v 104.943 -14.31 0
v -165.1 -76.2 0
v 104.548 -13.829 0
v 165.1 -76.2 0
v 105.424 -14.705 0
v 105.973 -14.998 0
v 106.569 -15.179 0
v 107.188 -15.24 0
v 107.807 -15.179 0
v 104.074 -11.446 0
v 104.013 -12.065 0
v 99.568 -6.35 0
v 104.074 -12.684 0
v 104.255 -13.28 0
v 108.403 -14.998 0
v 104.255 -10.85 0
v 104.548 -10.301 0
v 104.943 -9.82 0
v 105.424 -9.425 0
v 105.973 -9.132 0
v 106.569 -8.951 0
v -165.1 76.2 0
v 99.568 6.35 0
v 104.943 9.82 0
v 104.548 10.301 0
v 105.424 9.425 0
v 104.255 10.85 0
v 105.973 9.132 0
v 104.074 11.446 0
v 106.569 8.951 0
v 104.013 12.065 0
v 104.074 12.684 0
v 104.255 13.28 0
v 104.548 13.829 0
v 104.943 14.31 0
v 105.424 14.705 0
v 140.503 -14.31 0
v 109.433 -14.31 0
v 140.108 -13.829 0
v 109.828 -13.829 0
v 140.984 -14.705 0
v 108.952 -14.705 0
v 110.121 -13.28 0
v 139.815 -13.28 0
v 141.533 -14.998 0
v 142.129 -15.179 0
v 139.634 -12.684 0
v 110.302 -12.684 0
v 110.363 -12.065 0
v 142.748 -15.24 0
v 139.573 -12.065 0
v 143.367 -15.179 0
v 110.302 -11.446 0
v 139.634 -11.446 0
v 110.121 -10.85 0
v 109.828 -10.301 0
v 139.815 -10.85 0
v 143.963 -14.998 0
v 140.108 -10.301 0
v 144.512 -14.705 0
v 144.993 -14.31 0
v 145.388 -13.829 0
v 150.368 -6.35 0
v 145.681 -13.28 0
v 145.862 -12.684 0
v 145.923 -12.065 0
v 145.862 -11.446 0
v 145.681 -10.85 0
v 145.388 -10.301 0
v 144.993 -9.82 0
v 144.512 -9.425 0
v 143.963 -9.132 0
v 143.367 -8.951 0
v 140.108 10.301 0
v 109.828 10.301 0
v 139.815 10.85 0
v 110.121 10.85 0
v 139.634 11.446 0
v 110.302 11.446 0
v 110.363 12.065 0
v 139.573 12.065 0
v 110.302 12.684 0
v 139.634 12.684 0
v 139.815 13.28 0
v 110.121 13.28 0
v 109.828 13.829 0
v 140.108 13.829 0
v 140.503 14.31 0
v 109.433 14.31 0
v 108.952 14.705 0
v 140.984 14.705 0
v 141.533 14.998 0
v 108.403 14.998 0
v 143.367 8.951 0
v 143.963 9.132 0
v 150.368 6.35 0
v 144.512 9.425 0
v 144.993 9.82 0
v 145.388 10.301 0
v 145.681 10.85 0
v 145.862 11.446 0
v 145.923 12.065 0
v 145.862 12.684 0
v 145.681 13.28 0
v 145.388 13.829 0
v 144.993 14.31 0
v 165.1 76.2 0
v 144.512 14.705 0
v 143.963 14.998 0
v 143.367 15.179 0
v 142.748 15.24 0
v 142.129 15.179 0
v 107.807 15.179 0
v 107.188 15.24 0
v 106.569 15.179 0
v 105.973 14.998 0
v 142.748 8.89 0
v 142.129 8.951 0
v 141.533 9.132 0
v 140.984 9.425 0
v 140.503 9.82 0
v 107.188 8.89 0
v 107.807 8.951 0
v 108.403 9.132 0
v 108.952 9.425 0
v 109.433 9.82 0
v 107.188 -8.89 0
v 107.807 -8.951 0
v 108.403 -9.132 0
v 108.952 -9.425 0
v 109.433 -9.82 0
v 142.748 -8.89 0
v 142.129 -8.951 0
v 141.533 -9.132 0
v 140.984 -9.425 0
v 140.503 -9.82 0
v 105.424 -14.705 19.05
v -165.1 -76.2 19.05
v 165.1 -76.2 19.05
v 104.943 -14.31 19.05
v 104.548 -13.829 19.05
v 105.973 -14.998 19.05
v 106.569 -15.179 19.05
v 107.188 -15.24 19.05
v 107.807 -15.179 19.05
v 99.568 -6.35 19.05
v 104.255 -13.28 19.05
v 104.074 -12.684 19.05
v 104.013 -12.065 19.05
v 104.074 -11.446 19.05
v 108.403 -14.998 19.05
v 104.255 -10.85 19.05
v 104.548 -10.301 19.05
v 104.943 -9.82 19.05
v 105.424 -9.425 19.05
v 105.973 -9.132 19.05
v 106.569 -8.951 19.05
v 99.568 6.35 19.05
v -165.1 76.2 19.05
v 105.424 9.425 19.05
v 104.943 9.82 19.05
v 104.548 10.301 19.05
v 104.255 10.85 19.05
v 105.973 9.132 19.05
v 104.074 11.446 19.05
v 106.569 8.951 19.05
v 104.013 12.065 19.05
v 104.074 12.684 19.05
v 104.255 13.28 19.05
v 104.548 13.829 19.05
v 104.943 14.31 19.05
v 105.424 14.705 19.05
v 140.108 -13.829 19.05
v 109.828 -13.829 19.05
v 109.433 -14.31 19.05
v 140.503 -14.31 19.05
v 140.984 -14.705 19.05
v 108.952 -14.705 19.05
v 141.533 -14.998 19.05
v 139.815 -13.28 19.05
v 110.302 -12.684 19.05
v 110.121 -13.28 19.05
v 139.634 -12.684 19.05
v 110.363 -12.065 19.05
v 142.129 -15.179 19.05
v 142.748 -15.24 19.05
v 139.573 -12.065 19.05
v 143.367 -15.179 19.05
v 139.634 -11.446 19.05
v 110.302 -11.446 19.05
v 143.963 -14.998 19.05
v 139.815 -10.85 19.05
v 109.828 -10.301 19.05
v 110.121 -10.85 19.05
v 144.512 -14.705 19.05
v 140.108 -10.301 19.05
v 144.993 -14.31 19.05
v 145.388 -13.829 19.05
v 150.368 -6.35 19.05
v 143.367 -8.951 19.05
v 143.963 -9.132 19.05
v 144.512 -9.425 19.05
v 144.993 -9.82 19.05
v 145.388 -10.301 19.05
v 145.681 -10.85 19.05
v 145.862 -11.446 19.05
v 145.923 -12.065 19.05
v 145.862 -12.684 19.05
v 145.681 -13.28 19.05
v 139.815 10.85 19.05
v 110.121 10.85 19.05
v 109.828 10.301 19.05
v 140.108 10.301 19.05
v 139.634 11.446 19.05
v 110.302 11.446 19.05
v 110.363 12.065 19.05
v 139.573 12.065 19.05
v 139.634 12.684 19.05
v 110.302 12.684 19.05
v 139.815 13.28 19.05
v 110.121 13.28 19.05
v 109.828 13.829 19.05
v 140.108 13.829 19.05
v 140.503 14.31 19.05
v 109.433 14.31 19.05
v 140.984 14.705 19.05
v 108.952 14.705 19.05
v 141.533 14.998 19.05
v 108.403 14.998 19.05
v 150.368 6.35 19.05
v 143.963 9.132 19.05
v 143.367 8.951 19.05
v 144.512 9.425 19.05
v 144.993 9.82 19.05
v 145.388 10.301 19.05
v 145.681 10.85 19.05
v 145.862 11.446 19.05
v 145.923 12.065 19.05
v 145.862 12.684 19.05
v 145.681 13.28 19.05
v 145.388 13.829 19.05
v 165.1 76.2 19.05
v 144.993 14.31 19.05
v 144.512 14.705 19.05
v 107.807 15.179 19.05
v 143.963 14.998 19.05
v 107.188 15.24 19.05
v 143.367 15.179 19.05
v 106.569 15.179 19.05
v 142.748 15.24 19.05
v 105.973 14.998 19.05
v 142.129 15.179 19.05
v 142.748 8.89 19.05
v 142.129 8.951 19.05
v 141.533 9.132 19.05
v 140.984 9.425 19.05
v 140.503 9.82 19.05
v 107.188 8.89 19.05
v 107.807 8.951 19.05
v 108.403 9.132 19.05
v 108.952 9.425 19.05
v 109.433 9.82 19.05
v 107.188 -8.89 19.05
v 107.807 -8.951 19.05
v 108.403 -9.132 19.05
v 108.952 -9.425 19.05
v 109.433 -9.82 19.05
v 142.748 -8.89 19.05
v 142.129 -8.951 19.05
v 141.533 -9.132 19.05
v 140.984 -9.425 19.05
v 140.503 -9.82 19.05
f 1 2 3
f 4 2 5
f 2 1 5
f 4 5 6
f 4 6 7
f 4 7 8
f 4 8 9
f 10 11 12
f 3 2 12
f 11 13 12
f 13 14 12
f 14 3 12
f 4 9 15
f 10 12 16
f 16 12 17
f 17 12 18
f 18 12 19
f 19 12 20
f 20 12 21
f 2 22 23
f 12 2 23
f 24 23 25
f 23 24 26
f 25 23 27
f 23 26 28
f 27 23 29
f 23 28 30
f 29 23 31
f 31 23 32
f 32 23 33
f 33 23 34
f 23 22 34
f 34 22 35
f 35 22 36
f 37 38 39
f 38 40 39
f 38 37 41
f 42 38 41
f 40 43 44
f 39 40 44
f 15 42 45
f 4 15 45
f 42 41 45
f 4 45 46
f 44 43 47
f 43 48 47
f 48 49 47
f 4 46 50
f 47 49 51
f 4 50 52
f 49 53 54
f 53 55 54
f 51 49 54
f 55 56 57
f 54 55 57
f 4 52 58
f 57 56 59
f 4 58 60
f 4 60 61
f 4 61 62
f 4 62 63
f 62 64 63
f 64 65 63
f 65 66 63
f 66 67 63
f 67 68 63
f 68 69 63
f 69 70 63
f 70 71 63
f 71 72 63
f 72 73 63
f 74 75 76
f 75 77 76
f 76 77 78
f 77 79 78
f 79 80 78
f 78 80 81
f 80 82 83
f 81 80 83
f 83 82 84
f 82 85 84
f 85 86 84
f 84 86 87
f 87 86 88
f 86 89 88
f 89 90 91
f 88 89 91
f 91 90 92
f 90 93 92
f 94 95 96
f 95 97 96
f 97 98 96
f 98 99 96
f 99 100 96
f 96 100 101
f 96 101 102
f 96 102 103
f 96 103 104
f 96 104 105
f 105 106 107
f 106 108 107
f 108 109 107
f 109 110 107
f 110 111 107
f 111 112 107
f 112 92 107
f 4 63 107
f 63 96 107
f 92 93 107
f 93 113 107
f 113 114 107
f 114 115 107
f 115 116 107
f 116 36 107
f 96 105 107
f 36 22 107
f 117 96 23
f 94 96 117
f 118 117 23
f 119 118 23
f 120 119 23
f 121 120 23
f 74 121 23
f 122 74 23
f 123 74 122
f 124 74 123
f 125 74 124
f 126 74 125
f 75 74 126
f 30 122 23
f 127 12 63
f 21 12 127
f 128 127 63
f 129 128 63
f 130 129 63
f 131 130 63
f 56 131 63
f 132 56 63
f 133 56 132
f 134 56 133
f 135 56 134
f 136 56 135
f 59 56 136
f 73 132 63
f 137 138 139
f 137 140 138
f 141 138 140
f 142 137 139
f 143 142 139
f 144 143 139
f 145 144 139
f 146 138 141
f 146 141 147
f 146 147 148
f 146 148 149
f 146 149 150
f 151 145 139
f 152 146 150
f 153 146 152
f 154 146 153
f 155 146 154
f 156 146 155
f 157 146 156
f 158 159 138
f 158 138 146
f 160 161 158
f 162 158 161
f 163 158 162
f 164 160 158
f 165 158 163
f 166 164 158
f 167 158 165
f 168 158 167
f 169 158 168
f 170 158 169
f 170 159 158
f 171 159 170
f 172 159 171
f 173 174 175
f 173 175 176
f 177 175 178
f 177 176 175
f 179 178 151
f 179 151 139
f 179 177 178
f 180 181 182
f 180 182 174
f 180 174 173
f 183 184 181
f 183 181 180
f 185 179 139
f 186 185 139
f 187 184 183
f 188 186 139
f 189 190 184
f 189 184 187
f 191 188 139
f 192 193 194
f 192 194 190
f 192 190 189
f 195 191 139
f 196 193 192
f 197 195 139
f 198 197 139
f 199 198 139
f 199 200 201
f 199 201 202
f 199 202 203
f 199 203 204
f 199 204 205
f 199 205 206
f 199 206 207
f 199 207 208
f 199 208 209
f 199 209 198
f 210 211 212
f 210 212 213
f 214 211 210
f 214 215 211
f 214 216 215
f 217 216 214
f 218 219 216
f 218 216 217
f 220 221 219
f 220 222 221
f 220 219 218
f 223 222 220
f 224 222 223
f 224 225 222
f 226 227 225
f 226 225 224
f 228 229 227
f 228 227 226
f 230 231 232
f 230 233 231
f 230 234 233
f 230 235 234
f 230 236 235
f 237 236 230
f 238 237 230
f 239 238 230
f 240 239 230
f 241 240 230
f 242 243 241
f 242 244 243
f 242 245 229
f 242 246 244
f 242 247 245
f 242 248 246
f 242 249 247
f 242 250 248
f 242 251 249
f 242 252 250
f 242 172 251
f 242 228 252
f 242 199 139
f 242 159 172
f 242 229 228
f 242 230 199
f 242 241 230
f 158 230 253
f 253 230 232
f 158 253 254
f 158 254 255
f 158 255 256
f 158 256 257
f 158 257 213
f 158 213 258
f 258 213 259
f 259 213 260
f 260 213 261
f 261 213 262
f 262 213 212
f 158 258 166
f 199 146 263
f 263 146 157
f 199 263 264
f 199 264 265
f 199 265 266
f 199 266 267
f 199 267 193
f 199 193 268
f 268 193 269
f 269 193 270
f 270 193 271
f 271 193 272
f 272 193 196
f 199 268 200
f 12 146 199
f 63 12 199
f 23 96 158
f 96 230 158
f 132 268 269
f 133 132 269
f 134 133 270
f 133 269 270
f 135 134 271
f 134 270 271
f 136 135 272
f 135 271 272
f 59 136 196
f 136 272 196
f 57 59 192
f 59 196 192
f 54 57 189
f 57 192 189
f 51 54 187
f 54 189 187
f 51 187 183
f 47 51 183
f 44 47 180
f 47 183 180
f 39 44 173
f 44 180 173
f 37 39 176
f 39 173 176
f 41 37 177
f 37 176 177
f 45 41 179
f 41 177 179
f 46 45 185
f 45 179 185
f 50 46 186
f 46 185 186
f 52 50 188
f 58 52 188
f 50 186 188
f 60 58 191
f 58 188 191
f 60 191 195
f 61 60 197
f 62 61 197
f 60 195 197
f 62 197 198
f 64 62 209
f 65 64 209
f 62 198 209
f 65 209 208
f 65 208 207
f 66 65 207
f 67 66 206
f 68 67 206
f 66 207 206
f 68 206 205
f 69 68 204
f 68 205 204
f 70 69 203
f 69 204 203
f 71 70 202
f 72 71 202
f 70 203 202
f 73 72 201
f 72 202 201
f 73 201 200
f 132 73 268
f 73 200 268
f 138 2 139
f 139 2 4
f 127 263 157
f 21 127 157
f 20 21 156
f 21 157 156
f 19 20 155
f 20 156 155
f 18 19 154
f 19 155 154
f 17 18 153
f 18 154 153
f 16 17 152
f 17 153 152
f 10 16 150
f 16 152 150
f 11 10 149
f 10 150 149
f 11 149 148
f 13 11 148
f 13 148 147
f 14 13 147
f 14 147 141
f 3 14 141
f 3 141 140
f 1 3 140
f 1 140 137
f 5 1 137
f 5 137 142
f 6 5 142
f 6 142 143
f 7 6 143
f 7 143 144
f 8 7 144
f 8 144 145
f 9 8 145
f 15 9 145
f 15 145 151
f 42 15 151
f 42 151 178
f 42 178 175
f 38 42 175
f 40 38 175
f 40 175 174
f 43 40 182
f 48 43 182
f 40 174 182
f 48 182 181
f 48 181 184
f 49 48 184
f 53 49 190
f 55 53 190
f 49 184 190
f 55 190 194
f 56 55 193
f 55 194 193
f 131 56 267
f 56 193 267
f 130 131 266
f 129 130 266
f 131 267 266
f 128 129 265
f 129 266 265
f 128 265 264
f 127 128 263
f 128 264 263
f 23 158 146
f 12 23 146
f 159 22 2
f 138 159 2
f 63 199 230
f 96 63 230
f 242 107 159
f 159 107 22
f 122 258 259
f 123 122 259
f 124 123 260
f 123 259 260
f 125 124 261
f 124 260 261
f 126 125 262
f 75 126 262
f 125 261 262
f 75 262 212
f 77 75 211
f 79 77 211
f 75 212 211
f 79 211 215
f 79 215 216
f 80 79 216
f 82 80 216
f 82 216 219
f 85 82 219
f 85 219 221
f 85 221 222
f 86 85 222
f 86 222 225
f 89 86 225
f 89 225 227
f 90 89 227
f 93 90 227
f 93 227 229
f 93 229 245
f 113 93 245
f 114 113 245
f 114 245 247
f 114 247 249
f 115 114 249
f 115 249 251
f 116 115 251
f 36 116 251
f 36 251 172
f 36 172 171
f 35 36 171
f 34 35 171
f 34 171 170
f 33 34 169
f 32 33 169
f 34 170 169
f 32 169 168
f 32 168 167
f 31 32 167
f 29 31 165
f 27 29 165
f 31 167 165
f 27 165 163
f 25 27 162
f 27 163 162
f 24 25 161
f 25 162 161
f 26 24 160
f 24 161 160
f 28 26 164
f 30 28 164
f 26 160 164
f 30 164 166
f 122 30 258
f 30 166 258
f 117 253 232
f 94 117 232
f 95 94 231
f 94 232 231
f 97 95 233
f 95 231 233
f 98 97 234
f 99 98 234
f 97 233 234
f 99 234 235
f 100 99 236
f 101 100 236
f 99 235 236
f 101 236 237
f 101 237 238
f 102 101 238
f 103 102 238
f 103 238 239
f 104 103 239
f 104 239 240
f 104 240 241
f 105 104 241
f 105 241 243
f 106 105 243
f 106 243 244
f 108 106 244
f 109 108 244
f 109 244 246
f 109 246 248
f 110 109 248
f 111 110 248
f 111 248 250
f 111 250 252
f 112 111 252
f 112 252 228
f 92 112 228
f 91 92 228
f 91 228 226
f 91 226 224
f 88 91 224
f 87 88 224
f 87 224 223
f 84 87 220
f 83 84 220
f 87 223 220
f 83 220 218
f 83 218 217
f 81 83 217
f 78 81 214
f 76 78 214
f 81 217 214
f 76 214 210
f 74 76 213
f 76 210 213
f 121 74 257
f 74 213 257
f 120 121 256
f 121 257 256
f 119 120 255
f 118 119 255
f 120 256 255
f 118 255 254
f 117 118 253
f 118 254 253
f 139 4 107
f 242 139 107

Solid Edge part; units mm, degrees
sketch "Sketch1" plane through (0, 0, 0) normal (0, 0, 1) x (1, 0, 0)
  line L0 (-165.1, -76.2) -> (165.1, -76.2)
  line L1 (165.1, -76.2) -> (165.1, 76.2)
  line L2 (165.1, 76.2) -> (-165.1, 76.2)
  line L3 (-165.1, 76.2) -> (-165.1, -76.2)
  dimension "D1" = 330.2
  dimension "D2" = 152.4
extrude "Protrusion1" add sketch "Sketch1" along normal blind 19.05
sketch "Sketch2" plane through (0, 0, 19.05) normal (0, 0, 1) x (1, 0, 0)
  line L0 (99.568, -6.35) -> (150.368, -6.35)
  line L1 (150.368, -6.35) -> (150.368, 6.35)
  line L2 (150.368, 6.35) -> (99.568, 6.35)
  line L3 (99.568, 6.35) -> (99.568, -6.35)
  dimension "D1" = 264.668
  dimension "D2" = 50.8
  dimension "D3" = 12.7
extrude "ExtrudedCutout_2" cut sketch "Sketch2" against normal blind 25.4
sketch "Sketch3" plane through (0, 0, 19.05) normal (0, 0, 1) x (0, -1, 0)
  circle A0 centre (-12.065, 107.188) radius 3.175
  circle A1 centre (-12.065, 142.748) radius 3.175
  dimension "D1" = 12.065
  dimension "D2" = 35.56
  dimension "D3" = 22.352
extrude "TopPivotMountHole12" cut sketch "Sketch3" against normal blind 25.4
mirror "Mirror1" about plane through (0, 0, 0) normal (0, -1, 0) of "TopPivotMountHole12"
properties material "Wood, Oak"
